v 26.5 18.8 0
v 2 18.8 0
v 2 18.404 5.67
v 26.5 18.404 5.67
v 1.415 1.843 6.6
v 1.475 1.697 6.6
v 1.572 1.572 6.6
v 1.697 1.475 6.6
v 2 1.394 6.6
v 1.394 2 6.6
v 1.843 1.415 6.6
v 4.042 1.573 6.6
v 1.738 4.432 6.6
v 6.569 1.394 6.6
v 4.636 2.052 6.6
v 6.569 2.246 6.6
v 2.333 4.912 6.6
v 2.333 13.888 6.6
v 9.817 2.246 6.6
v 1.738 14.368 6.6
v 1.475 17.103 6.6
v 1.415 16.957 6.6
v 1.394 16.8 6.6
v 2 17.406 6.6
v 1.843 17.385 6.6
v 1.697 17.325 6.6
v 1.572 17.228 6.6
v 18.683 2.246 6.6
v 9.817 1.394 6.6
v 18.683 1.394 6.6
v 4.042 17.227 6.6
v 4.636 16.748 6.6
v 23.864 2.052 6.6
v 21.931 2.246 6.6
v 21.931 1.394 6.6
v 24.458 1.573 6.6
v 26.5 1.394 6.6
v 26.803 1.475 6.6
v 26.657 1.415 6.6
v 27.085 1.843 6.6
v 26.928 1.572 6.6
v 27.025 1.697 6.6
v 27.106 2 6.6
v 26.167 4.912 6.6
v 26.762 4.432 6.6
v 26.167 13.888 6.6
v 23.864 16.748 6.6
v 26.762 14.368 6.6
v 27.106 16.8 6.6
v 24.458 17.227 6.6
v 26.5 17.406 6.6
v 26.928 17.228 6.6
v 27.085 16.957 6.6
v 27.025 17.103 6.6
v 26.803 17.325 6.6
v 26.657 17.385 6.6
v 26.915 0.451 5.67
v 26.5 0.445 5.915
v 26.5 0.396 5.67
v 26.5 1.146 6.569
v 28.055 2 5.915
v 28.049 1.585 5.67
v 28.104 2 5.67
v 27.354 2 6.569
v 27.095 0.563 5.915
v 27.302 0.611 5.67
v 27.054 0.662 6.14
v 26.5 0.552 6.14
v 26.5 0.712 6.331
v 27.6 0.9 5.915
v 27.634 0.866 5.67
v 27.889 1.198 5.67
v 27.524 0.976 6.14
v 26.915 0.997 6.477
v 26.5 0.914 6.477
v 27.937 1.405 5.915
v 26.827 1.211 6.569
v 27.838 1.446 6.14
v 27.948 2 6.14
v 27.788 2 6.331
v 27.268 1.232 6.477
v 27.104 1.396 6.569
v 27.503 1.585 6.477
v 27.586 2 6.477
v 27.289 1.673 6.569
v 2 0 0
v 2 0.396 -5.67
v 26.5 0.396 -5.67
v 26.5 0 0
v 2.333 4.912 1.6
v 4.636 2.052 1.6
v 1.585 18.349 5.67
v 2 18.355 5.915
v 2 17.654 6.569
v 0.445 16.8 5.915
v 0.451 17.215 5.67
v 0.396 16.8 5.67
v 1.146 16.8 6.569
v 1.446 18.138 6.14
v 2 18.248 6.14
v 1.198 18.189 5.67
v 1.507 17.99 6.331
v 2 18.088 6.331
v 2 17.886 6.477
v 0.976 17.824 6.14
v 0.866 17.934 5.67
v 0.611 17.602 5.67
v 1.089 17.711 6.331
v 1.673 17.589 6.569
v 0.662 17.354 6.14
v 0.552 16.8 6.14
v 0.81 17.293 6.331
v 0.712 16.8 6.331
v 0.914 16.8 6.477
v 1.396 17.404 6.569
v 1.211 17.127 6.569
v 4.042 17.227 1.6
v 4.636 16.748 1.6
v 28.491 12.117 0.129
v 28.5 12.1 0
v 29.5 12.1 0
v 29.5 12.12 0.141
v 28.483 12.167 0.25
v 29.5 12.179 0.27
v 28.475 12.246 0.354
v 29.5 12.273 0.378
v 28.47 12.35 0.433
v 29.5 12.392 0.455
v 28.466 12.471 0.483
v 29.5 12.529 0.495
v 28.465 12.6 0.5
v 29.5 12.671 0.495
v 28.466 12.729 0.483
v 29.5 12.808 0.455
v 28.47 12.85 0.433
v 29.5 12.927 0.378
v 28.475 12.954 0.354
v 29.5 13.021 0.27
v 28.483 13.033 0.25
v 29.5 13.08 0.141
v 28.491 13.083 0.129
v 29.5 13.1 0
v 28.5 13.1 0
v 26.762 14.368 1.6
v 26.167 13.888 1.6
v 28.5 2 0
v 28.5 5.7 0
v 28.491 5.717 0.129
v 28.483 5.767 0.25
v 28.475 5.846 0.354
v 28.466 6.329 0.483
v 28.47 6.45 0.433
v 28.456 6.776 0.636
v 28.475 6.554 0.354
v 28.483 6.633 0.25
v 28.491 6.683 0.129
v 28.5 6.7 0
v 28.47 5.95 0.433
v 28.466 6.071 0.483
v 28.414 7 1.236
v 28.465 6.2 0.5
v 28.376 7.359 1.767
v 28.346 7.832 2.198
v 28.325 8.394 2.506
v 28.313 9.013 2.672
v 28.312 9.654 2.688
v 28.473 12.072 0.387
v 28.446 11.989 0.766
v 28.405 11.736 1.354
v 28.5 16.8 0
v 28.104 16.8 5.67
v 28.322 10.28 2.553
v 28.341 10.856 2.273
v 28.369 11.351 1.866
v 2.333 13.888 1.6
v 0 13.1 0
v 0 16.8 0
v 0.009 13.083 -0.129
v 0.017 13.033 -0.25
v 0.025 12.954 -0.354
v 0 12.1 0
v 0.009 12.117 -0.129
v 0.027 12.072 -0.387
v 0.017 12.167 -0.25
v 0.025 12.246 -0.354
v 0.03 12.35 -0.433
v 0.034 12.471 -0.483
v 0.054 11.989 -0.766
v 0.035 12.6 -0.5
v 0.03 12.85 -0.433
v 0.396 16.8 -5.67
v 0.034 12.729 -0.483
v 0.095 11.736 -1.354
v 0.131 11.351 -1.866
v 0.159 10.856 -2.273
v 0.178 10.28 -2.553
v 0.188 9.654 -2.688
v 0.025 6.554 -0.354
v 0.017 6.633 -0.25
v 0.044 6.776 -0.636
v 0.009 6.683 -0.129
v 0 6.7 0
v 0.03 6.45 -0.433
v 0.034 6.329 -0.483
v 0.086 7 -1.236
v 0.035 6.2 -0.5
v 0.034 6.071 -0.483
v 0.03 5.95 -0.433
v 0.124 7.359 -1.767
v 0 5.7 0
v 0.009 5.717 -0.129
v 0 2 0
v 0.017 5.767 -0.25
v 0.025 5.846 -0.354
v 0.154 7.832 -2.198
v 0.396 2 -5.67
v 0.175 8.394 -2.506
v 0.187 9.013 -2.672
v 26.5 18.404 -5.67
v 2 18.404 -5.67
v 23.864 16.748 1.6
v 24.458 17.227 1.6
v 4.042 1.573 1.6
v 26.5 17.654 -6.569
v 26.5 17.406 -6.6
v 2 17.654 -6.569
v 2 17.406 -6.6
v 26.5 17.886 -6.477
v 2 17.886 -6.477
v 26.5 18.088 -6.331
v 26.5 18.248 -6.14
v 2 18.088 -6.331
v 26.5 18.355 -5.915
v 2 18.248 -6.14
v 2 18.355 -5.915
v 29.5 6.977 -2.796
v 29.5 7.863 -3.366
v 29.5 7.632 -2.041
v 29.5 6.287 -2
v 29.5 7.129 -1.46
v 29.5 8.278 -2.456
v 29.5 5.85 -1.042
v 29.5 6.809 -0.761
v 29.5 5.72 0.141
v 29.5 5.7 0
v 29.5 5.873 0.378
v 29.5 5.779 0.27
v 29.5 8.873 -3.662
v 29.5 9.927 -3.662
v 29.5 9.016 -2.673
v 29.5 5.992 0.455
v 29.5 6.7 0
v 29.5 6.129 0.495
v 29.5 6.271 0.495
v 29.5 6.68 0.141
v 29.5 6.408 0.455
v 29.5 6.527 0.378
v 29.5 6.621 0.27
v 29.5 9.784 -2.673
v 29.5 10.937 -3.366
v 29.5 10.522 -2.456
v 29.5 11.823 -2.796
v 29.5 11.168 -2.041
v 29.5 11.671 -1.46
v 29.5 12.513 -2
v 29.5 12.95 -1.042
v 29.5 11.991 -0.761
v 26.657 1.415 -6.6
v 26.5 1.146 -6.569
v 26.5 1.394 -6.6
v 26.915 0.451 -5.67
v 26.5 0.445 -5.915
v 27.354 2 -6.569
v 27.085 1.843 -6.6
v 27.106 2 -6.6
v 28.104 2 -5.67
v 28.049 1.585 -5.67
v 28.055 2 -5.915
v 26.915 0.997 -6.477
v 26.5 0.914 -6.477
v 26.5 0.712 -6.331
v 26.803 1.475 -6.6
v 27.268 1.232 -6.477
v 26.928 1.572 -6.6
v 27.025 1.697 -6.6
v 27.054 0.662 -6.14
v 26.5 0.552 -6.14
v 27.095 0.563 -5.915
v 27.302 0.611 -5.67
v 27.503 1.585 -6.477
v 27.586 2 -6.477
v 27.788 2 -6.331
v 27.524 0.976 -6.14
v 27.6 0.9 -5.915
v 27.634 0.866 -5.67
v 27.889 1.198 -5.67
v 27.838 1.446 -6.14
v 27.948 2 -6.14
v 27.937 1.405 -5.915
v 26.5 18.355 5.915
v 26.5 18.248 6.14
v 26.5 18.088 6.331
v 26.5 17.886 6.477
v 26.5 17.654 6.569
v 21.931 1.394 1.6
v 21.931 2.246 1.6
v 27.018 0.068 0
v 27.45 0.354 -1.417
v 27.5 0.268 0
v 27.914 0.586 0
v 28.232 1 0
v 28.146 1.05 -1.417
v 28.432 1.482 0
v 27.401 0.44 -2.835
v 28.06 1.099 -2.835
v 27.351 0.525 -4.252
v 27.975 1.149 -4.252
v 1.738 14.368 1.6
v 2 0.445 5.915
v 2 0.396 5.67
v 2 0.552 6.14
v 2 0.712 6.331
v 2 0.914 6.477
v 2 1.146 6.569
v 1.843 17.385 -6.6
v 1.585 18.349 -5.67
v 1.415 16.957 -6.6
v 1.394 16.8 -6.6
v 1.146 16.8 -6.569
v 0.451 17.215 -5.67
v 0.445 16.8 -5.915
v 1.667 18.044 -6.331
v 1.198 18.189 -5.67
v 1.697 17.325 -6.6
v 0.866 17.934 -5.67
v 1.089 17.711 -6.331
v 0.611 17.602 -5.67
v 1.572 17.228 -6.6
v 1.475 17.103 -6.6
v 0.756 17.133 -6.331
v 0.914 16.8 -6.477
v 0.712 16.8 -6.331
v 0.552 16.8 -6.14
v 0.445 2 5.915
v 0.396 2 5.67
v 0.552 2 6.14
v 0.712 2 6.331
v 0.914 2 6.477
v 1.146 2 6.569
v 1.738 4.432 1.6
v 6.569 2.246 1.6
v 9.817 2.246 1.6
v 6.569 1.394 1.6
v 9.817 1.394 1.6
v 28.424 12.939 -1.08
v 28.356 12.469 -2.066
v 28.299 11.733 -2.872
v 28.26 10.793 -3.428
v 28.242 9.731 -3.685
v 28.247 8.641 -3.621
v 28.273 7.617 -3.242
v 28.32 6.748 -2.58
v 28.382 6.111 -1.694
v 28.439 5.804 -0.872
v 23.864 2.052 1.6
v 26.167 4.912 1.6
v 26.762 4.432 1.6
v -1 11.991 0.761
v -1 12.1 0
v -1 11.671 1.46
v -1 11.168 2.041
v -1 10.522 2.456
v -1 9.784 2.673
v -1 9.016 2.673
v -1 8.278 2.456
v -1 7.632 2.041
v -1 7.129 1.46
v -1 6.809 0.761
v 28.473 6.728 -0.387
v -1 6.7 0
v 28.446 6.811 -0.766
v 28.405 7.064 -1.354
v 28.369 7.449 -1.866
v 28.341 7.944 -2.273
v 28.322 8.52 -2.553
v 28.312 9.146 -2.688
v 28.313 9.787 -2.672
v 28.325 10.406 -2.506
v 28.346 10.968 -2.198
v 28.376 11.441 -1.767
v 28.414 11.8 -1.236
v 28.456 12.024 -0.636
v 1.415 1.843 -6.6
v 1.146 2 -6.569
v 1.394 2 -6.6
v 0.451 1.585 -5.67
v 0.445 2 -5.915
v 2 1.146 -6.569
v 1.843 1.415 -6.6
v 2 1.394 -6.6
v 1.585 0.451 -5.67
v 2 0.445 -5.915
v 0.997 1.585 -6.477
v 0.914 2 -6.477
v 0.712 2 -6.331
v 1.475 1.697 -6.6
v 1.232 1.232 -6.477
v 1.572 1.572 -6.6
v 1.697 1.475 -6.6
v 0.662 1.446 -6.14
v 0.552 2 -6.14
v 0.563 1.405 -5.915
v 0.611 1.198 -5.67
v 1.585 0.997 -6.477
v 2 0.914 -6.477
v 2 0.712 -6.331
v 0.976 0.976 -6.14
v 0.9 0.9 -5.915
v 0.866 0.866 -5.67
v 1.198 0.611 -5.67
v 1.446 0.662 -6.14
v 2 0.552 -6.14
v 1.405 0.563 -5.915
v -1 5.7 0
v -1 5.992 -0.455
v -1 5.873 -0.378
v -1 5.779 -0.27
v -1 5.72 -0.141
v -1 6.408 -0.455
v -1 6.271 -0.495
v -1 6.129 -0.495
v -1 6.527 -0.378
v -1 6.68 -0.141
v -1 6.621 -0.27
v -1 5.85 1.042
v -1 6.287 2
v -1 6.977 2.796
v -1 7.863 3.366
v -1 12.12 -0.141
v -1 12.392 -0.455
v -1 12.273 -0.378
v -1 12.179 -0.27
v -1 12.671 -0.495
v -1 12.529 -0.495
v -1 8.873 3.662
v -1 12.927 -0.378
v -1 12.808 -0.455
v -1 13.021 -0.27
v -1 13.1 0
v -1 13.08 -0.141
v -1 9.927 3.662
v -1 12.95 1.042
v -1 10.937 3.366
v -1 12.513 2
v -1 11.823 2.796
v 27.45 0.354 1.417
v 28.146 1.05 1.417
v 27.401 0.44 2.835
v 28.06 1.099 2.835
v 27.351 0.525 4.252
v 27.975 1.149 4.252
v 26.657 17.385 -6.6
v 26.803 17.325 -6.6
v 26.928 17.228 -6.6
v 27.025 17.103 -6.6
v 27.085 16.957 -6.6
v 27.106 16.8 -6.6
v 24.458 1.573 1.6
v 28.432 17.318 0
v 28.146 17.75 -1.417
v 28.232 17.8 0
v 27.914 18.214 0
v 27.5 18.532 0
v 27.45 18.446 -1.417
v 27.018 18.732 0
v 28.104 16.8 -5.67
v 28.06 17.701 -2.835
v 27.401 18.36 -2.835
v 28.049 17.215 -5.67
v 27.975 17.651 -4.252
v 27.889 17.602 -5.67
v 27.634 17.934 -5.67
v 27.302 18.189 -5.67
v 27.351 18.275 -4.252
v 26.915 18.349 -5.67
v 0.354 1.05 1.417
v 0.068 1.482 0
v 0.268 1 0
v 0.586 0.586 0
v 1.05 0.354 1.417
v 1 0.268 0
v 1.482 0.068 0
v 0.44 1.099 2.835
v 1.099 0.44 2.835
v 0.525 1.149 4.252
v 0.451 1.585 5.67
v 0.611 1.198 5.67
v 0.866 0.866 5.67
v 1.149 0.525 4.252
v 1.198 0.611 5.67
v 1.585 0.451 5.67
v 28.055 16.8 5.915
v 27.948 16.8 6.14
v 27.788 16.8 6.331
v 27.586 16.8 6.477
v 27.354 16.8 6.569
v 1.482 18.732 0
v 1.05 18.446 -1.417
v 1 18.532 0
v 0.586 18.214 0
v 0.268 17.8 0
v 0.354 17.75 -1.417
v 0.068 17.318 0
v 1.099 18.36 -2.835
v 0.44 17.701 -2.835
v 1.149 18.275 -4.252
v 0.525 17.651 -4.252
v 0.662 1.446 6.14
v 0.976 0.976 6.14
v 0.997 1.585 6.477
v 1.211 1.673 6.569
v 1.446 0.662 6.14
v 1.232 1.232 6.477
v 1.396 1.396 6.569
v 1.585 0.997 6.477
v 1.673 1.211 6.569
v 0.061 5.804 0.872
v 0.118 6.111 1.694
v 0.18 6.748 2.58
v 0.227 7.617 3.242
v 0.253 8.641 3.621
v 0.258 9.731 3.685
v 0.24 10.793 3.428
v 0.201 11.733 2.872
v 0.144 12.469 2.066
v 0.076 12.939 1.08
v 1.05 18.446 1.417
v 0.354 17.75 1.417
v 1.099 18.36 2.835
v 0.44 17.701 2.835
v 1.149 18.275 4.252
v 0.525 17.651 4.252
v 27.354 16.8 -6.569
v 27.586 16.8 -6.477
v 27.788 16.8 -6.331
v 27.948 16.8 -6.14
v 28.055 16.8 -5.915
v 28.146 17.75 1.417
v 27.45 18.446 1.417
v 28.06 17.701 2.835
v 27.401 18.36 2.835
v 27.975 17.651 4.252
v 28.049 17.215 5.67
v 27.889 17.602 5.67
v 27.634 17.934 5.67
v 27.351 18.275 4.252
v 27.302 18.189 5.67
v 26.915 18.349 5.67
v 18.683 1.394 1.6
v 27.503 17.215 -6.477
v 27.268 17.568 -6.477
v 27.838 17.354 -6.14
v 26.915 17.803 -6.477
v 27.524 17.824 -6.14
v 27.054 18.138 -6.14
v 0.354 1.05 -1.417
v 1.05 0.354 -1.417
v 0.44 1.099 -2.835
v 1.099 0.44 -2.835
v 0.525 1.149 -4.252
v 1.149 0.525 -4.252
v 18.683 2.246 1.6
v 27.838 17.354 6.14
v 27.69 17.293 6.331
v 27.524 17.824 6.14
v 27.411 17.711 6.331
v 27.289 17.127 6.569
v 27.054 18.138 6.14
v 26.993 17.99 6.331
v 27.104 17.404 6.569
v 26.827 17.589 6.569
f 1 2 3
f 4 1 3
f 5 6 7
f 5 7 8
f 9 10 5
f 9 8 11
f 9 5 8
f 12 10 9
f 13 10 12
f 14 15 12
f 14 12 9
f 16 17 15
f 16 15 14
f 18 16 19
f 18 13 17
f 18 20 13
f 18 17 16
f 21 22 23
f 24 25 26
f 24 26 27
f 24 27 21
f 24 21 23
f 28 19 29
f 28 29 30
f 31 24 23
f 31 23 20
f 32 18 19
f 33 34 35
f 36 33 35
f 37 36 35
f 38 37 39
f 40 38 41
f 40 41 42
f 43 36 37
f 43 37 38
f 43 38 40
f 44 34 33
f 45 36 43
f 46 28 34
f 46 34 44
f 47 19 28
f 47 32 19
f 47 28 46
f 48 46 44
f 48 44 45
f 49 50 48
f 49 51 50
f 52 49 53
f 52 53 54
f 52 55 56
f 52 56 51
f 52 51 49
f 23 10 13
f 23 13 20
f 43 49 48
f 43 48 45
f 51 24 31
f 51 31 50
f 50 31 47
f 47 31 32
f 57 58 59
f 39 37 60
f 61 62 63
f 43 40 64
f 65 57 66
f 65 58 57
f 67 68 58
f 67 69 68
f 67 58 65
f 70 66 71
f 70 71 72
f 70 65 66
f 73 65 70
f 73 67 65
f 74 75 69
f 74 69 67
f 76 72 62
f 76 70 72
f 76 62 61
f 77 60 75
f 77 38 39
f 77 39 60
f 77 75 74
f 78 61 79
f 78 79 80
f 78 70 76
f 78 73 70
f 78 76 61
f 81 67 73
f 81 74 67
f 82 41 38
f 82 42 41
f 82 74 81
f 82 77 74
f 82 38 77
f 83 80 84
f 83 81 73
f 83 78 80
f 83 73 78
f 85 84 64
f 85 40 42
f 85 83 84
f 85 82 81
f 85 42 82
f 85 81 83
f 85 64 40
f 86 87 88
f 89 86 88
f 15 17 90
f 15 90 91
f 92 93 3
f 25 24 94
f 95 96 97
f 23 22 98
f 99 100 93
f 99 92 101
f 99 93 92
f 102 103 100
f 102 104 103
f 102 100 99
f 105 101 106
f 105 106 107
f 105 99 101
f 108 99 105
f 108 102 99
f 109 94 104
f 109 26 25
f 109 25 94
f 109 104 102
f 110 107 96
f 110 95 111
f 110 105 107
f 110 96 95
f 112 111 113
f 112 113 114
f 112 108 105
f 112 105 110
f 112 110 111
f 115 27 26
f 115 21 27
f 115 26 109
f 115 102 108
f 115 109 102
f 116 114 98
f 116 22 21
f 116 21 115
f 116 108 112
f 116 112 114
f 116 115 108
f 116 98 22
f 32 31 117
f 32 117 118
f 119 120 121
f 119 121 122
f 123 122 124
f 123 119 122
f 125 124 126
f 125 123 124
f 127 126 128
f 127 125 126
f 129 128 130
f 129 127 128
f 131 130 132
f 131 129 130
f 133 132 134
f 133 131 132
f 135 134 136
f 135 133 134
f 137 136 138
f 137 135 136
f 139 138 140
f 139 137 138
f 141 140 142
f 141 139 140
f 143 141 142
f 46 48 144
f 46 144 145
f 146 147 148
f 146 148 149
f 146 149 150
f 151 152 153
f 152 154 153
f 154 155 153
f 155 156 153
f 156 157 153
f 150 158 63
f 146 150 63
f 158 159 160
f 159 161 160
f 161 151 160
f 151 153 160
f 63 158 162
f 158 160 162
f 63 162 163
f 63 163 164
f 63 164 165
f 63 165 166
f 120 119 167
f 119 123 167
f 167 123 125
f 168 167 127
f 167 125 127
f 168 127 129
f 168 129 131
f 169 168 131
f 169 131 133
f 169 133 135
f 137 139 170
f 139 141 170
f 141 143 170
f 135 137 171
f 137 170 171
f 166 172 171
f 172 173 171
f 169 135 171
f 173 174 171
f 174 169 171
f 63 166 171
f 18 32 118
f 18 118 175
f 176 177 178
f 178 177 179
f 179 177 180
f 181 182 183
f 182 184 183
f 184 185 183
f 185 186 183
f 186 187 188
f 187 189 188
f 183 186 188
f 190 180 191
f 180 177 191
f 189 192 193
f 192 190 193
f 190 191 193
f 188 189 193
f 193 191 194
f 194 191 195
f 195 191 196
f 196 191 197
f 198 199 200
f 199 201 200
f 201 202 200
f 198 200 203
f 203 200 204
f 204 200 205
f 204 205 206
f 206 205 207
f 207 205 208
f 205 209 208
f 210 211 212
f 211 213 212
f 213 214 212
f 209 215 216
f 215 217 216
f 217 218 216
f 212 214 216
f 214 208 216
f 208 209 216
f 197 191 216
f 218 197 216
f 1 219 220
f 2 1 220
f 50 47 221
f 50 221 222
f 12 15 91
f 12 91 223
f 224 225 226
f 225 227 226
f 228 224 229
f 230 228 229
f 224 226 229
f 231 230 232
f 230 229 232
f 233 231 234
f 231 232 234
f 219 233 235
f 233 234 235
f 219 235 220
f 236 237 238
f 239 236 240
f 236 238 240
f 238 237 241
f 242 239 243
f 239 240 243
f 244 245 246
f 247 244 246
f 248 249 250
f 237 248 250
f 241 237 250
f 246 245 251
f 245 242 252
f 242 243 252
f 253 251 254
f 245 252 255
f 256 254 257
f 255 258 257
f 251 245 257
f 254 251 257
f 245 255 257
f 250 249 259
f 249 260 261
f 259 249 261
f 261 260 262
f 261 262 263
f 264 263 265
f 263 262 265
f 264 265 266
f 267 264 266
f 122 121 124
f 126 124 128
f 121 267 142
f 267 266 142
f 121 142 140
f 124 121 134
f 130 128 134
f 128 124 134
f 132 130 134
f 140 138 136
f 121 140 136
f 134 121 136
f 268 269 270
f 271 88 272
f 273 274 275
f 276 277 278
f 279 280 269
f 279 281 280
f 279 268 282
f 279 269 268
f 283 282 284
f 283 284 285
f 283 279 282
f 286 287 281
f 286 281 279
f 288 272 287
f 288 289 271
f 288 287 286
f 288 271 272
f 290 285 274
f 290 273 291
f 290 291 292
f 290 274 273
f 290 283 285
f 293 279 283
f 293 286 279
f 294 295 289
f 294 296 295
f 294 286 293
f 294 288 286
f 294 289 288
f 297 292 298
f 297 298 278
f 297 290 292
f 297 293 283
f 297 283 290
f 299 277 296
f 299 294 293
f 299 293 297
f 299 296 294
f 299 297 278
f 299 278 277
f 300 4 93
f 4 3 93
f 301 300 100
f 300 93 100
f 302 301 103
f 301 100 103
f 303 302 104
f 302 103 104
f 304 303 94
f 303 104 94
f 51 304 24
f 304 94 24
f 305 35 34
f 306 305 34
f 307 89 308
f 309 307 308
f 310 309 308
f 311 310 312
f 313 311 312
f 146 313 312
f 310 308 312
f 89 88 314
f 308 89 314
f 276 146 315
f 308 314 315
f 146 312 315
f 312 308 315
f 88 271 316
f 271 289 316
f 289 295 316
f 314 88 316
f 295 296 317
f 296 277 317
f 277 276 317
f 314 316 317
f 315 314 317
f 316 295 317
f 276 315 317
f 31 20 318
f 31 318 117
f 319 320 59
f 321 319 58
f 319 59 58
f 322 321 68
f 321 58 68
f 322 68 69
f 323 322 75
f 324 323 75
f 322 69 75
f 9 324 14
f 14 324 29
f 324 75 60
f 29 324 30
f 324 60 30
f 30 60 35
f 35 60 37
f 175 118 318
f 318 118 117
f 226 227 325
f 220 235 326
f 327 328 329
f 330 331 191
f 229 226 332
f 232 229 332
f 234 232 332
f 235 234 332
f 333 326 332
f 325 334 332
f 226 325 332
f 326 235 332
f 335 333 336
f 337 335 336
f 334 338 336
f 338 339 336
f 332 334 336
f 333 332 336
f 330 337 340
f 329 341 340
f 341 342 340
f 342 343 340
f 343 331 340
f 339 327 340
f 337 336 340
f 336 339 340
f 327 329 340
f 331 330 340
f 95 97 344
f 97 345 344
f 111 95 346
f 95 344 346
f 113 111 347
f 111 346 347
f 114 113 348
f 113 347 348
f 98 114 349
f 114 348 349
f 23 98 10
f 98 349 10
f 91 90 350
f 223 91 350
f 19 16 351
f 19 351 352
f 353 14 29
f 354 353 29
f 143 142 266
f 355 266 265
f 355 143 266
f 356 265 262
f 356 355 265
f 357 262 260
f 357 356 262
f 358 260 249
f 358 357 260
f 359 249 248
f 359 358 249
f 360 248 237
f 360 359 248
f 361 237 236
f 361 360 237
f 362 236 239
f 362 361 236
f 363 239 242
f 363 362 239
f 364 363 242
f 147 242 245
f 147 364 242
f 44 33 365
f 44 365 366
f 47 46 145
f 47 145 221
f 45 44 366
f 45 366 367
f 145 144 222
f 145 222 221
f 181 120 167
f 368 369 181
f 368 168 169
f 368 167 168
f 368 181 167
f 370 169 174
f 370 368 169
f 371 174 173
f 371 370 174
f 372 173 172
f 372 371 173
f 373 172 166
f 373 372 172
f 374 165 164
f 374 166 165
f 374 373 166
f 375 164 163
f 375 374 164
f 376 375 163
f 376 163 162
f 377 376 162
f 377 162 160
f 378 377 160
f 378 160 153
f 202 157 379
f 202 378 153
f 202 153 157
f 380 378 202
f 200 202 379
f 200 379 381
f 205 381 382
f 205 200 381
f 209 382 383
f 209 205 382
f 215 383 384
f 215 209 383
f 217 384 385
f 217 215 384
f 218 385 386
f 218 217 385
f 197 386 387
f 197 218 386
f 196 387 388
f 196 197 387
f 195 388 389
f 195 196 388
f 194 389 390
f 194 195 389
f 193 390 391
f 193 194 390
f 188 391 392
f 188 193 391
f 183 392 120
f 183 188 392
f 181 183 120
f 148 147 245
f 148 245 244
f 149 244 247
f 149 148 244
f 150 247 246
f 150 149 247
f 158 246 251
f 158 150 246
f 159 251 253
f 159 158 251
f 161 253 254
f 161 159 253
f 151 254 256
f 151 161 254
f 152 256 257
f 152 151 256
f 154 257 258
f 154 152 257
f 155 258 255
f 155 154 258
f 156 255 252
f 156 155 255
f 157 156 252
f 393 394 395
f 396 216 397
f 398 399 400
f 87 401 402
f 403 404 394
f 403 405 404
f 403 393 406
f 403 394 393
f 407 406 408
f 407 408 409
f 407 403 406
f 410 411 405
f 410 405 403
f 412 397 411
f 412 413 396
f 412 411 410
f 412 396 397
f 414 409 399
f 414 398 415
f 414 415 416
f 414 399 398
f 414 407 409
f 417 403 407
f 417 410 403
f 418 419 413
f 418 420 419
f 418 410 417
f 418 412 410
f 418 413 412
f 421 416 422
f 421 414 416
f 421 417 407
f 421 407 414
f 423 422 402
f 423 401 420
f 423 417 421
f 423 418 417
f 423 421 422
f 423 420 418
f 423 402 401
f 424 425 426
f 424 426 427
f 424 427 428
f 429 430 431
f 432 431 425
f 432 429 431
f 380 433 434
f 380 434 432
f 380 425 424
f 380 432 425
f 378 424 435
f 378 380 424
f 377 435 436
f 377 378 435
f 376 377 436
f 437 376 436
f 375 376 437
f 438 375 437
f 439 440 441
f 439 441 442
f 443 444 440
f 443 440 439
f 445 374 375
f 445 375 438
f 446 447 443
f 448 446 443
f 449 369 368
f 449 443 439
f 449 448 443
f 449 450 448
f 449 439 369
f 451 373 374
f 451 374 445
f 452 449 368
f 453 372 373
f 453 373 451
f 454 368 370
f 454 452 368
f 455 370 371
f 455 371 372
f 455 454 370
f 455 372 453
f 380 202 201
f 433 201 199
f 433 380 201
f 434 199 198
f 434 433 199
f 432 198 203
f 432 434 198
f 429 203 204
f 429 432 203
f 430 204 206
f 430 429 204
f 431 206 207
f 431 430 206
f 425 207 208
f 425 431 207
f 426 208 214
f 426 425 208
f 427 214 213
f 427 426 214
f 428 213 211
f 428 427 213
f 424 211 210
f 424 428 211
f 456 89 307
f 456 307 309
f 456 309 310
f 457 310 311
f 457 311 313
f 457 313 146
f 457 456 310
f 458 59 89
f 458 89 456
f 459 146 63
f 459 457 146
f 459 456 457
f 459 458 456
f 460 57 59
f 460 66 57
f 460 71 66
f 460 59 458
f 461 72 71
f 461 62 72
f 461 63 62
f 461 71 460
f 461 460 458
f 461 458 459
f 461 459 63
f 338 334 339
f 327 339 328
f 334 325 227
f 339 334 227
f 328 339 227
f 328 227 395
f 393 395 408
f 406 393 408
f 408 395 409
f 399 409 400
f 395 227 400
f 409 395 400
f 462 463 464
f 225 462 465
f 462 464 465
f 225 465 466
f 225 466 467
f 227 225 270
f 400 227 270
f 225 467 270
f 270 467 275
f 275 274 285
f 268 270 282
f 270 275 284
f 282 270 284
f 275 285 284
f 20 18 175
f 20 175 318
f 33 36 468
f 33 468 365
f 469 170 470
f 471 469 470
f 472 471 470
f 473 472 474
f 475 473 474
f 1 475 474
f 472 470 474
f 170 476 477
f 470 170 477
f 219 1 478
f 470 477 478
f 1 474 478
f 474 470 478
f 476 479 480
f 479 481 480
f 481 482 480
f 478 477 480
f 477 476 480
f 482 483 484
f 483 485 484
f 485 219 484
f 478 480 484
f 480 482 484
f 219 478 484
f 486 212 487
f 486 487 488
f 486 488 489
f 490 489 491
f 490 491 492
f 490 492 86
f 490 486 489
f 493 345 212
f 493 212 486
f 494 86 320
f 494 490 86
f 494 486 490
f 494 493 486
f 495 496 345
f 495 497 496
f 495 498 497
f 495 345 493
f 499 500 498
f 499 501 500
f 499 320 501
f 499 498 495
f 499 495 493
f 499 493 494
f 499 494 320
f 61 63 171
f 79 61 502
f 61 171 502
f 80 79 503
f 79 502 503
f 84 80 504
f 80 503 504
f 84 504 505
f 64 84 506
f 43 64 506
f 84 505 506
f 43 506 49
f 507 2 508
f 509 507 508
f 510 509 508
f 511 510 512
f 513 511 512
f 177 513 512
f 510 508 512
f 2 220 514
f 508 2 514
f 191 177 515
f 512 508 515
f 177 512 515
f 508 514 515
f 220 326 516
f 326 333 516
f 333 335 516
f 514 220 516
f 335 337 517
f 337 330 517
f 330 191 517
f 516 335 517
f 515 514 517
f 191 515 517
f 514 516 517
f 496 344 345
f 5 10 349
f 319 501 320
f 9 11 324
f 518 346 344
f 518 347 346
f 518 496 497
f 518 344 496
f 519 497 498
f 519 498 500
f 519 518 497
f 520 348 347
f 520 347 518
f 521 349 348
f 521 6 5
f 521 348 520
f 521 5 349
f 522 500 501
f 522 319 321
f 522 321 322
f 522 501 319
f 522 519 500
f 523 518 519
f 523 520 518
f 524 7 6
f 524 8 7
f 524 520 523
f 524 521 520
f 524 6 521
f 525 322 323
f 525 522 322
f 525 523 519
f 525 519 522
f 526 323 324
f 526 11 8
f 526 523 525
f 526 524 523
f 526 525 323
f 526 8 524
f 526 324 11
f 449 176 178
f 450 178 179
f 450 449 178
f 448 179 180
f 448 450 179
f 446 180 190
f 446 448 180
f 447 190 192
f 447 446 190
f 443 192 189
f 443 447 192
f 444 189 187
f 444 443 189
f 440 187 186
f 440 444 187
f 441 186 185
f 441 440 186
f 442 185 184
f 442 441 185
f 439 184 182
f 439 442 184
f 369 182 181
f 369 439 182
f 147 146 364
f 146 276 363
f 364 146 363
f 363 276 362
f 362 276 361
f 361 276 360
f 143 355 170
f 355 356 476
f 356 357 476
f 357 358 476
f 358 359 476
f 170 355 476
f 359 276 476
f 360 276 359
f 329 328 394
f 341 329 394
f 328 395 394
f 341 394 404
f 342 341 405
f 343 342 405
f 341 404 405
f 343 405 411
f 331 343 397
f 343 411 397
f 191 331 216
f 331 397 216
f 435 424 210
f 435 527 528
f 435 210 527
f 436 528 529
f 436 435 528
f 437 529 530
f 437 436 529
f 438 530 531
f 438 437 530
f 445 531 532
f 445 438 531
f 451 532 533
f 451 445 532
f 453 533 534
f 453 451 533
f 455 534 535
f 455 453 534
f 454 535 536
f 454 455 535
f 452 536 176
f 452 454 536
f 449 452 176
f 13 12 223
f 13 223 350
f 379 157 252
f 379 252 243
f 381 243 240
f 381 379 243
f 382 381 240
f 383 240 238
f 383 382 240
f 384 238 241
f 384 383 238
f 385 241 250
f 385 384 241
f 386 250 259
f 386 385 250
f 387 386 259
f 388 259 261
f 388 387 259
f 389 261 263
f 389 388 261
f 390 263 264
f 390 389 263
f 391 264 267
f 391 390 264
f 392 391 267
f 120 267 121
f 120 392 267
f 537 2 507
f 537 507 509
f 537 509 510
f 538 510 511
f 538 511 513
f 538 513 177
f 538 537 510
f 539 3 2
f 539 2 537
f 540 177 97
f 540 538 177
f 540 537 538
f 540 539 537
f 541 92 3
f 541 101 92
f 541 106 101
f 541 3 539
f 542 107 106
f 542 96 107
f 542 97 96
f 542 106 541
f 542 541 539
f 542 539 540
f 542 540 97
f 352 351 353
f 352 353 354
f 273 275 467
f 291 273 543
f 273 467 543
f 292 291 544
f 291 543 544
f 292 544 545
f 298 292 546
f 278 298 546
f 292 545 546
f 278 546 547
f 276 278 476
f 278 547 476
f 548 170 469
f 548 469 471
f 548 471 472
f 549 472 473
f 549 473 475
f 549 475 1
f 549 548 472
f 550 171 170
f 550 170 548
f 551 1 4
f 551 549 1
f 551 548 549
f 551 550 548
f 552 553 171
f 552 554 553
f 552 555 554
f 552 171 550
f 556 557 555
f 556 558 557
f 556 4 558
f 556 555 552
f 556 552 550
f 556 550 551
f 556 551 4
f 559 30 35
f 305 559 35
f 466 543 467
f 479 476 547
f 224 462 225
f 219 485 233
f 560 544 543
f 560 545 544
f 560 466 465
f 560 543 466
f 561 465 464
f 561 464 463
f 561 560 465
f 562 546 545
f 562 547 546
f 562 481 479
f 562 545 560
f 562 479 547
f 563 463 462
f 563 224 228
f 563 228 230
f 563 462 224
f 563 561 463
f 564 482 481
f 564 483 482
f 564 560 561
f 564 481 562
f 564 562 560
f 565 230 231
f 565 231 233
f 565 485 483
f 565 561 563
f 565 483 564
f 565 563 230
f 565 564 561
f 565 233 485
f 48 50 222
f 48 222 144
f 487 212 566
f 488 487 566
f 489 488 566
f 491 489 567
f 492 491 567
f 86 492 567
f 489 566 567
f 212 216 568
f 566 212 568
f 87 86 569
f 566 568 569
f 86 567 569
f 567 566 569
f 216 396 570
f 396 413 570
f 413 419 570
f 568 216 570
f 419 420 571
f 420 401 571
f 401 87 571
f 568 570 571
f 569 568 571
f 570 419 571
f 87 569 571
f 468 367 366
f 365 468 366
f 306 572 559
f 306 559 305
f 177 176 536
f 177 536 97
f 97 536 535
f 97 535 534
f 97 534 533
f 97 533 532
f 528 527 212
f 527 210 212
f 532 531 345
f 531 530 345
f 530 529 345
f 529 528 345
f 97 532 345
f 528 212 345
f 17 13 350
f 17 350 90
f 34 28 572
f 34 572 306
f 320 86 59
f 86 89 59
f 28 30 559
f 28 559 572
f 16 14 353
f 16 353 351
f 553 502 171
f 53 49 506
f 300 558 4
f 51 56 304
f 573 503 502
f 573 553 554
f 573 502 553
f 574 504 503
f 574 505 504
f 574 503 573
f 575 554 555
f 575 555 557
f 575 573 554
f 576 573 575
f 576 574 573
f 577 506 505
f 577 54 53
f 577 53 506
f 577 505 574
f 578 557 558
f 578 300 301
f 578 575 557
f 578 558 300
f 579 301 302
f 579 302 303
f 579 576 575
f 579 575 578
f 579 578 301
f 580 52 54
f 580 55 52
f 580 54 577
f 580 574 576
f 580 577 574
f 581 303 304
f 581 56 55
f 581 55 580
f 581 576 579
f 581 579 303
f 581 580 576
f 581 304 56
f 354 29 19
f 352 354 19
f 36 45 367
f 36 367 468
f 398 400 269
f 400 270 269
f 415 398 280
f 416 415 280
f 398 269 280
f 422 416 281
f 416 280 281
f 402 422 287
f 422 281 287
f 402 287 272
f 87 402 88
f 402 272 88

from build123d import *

# Parameters (mm, degrees)
EXTRUSION1_DEPTH           = 6.6
EXTRUSION1_TAPER           = 4.000000000000009
EXTRUSION1_OTHER_WAY_DEPTH = 6.6
EXTRUSION1_OTHER_WAY_TAPER = 4.000000000000009
CONG_1_R                   = 1
ESQUISSE2_R                = 2.7
ENL_V_MAT_EXTRU_1_DEPTH    = 35.77427225377981
EXTRUSION2_START           = -11
EXTRUSION2_DEPTH           = 11
EXTRUSION3_DEPTH           = 19.5
ESQUISSE5_W                = 3.2474365518074073
ESQUISSE5_H                = 0.8522228738252646
ESQUISSE5_W_2              = 3.247436551807409
EXTRUSION4_DEPTH           = 5


with BuildPart() as part:
    # Esquisse1 → Extrusion1 (new body)
    with BuildSketch(Plane.XY):
        with BuildLine():
            Line((2.000000000000013, 0), (26.500000000000004, 0))
            ThreePointArc((26.500000000000004, 0), (27.9142135623731, 0.5857864376269051), (28.500000000000004, 2.0000000000000004))
            Line((28.500000000000004, 2.0000000000000004), (28.499999999999996, 16.8))
            ThreePointArc((28.499999999999996, 16.8), (27.914213562373096, 18.2142135623731), (26.499999999999996, 18.800000000000004))
            Line((26.499999999999996, 18.800000000000004), (2, 18.800000000000004))
            ThreePointArc((2, 18.800000000000004), (0.5857864376269051, 18.214213562373097), (0, 16.8))
            Line((0, 16.8), (-6.3e-16, 2.000000000000013))
            ThreePointArc((-6.3e-16, 2.000000000000013), (0.5857864376269053, 0.5857864376269042), (2.000000000000013, 0))
        make_face()
    extrude(amount=EXTRUSION1_DEPTH, taper=EXTRUSION1_TAPER)

    # Esquisse1 → Extrusion1 other way (add)
    with BuildSketch(Plane.XY):
        with BuildLine():
            Line((2.000000000000013, 0), (26.500000000000004, 0))
            ThreePointArc((26.500000000000004, 0), (27.9142135623731, 0.5857864376269051), (28.500000000000004, 2.0000000000000004))
            Line((28.500000000000004, 2.0000000000000004), (28.499999999999996, 16.8))
            ThreePointArc((28.499999999999996, 16.8), (27.914213562373096, 18.2142135623731), (26.499999999999996, 18.800000000000004))
            Line((26.499999999999996, 18.800000000000004), (2, 18.800000000000004))
            ThreePointArc((2, 18.800000000000004), (0.5857864376269051, 18.214213562373097), (0, 16.8))
            Line((0, 16.8), (-6.3e-16, 2.000000000000013))
            ThreePointArc((-6.3e-16, 2.000000000000013), (0.5857864376269053, 0.5857864376269042), (2.000000000000013, 0))
        make_face()
    extrude(amount=-EXTRUSION1_OTHER_WAY_DEPTH, taper=EXTRUSION1_OTHER_WAY_TAPER)

    # Congé1
    cong_1_edges = [part.edges().sort_by_distance(p)[0] for p in [
        (0.9121282088461893, 0.9121282088461893, 6.6),
        (14.250000000000007, 0.46151695882717014, 6.6000000000000005),
        (27.587871791153816, 0.9121282088461893, 6.6),
        (28.03848304117283, 9.4, 6.6000000000000005),
        (27.587871791153812, 17.887871791153817, 6.6),
        (14.25, 18.338483041172836, 6.6000000000000005),
        (0.9121282088461911, 17.887871791153813, -6.6),
        (14.250000000000005, 18.338483041172836, -6.6),
        (27.587871791153812, 17.887871791153813, -6.6),
        (28.03848304117283, 9.400000000000006, -6.6),
        (27.587871791153816, 0.9121282088461875, -6.6),
        (14.250000000000004, 0.46151695882717014, -6.6),
        (0.9121282088461893, 0.9121282088461893, -6.6),
        (0.46151695882717014, 9.4, -6.6),
        (0.9121282088461893, 17.887871791153813, 6.6),
        (0.46151695882717014, 9.400000000000006, 6.6000000000000005),
    ]]
    fillet(cong_1_edges, radius=CONG_1_R)

    # Esquisse2 → Enlèv. mat.-Extru.1 (cut, through all)
    with BuildSketch(Plane(origin=(0, 0, 0), x_dir=(0, 0, -1), z_dir=(1, 0, 0))):
        with Locations(Location((0, 9.40000000000001, 0), (0, 0, 90))):
            Circle(ESQUISSE2_R)
    extrude(amount=ENL_V_MAT_EXTRU_1_DEPTH, mode=Mode.SUBTRACT)

    # Esquisse3 → Extrusion2 (add)
    with BuildSketch(Plane(origin=(10, 0, 0), x_dir=(0, 0, -1), z_dir=(1, 0, 0)).offset(EXTRUSION2_START)):
        with BuildLine():
            ThreePointArc((0, 12.100000000000007), (-2.6999999999999975, 9.400000000000007), (6.16e-15, 6.700000000000009))
            ThreePointArc((6.16e-15, 6.700000000000009), (0.5000000000000038, 6.200000000000009), (5.89e-15, 5.700000000000011))
            ThreePointArc((5.89e-15, 5.700000000000011), (-3.6999999999999975, 9.400000000000006), (2.3e-16, 13.100000000000007))
            ThreePointArc((2.3e-16, 13.100000000000007), (0.4999999999999991, 12.600000000000007), (0, 12.100000000000007))
        make_face()
    extrude(amount=EXTRUSION2_DEPTH)

    # Esquisse4 → Extrusion3 (add)
    with BuildSketch(Plane(origin=(10, 0, 0), x_dir=(0, 0, -1), z_dir=(1, 0, 0))):
        with BuildLine():
            ThreePointArc((0, 6.700000000000006), (2.700000000000003, 9.400000000000043), (-6.772e-14, 12.10000000000001))
            ThreePointArc((-6.772e-14, 12.10000000000001), (-0.5000000000000799, 12.6), (-9.088e-14, 13.10000000000001))
            ThreePointArc((-9.088e-14, 13.10000000000001), (3.700000000000002, 9.400000000000054), (-6.8e-16, 5.700000000000007))
            ThreePointArc((-6.8e-16, 5.700000000000007), (-0.5000000000000002, 6.200000000000007), (0, 6.700000000000006))
        make_face()
    extrude(amount=EXTRUSION3_DEPTH)

    # Esquisse5 → Extrusion4 (cut)
    with BuildSketch(Plane.XY.offset(6.6)):
        with Locations((20.306831390499674, 1.820143481877461)):
            Rectangle(ESQUISSE5_W, ESQUISSE5_H)
        with Locations((8.193168609500333, 1.820143481877461)):
            Rectangle(ESQUISSE5_W_2, ESQUISSE5_H)
        Polygon((1.7379562995508964, 14.367502834636706), (4.041510066838186, 17.227086821613987), (4.636308888649757, 16.74794332626577), (2.3327551213624673, 13.888359339288488), align=None)
        Polygon((2.3327551213624673, 4.911640660711529), (4.636308888649757, 2.052056673734249), (4.041510066838186, 1.5729131783860304), (1.7379562995508964, 4.432497165363312), align=None)
        Polygon((26.762043700449112, 4.43249716536331), (24.45848993316182, 1.5729131783860304), (23.863691111350253, 2.0520566737342487), (26.16724487863754, 4.9116406607115275), align=None)
        Polygon((26.16724487863754, 13.888359339288483), (23.863691111350253, 16.747943326265762), (24.45848993316182, 17.227086821613973), (26.762043700449112, 14.3675028346367), align=None)
    extrude(amount=-EXTRUSION4_DEPTH, mode=Mode.SUBTRACT)


solid = part.part
